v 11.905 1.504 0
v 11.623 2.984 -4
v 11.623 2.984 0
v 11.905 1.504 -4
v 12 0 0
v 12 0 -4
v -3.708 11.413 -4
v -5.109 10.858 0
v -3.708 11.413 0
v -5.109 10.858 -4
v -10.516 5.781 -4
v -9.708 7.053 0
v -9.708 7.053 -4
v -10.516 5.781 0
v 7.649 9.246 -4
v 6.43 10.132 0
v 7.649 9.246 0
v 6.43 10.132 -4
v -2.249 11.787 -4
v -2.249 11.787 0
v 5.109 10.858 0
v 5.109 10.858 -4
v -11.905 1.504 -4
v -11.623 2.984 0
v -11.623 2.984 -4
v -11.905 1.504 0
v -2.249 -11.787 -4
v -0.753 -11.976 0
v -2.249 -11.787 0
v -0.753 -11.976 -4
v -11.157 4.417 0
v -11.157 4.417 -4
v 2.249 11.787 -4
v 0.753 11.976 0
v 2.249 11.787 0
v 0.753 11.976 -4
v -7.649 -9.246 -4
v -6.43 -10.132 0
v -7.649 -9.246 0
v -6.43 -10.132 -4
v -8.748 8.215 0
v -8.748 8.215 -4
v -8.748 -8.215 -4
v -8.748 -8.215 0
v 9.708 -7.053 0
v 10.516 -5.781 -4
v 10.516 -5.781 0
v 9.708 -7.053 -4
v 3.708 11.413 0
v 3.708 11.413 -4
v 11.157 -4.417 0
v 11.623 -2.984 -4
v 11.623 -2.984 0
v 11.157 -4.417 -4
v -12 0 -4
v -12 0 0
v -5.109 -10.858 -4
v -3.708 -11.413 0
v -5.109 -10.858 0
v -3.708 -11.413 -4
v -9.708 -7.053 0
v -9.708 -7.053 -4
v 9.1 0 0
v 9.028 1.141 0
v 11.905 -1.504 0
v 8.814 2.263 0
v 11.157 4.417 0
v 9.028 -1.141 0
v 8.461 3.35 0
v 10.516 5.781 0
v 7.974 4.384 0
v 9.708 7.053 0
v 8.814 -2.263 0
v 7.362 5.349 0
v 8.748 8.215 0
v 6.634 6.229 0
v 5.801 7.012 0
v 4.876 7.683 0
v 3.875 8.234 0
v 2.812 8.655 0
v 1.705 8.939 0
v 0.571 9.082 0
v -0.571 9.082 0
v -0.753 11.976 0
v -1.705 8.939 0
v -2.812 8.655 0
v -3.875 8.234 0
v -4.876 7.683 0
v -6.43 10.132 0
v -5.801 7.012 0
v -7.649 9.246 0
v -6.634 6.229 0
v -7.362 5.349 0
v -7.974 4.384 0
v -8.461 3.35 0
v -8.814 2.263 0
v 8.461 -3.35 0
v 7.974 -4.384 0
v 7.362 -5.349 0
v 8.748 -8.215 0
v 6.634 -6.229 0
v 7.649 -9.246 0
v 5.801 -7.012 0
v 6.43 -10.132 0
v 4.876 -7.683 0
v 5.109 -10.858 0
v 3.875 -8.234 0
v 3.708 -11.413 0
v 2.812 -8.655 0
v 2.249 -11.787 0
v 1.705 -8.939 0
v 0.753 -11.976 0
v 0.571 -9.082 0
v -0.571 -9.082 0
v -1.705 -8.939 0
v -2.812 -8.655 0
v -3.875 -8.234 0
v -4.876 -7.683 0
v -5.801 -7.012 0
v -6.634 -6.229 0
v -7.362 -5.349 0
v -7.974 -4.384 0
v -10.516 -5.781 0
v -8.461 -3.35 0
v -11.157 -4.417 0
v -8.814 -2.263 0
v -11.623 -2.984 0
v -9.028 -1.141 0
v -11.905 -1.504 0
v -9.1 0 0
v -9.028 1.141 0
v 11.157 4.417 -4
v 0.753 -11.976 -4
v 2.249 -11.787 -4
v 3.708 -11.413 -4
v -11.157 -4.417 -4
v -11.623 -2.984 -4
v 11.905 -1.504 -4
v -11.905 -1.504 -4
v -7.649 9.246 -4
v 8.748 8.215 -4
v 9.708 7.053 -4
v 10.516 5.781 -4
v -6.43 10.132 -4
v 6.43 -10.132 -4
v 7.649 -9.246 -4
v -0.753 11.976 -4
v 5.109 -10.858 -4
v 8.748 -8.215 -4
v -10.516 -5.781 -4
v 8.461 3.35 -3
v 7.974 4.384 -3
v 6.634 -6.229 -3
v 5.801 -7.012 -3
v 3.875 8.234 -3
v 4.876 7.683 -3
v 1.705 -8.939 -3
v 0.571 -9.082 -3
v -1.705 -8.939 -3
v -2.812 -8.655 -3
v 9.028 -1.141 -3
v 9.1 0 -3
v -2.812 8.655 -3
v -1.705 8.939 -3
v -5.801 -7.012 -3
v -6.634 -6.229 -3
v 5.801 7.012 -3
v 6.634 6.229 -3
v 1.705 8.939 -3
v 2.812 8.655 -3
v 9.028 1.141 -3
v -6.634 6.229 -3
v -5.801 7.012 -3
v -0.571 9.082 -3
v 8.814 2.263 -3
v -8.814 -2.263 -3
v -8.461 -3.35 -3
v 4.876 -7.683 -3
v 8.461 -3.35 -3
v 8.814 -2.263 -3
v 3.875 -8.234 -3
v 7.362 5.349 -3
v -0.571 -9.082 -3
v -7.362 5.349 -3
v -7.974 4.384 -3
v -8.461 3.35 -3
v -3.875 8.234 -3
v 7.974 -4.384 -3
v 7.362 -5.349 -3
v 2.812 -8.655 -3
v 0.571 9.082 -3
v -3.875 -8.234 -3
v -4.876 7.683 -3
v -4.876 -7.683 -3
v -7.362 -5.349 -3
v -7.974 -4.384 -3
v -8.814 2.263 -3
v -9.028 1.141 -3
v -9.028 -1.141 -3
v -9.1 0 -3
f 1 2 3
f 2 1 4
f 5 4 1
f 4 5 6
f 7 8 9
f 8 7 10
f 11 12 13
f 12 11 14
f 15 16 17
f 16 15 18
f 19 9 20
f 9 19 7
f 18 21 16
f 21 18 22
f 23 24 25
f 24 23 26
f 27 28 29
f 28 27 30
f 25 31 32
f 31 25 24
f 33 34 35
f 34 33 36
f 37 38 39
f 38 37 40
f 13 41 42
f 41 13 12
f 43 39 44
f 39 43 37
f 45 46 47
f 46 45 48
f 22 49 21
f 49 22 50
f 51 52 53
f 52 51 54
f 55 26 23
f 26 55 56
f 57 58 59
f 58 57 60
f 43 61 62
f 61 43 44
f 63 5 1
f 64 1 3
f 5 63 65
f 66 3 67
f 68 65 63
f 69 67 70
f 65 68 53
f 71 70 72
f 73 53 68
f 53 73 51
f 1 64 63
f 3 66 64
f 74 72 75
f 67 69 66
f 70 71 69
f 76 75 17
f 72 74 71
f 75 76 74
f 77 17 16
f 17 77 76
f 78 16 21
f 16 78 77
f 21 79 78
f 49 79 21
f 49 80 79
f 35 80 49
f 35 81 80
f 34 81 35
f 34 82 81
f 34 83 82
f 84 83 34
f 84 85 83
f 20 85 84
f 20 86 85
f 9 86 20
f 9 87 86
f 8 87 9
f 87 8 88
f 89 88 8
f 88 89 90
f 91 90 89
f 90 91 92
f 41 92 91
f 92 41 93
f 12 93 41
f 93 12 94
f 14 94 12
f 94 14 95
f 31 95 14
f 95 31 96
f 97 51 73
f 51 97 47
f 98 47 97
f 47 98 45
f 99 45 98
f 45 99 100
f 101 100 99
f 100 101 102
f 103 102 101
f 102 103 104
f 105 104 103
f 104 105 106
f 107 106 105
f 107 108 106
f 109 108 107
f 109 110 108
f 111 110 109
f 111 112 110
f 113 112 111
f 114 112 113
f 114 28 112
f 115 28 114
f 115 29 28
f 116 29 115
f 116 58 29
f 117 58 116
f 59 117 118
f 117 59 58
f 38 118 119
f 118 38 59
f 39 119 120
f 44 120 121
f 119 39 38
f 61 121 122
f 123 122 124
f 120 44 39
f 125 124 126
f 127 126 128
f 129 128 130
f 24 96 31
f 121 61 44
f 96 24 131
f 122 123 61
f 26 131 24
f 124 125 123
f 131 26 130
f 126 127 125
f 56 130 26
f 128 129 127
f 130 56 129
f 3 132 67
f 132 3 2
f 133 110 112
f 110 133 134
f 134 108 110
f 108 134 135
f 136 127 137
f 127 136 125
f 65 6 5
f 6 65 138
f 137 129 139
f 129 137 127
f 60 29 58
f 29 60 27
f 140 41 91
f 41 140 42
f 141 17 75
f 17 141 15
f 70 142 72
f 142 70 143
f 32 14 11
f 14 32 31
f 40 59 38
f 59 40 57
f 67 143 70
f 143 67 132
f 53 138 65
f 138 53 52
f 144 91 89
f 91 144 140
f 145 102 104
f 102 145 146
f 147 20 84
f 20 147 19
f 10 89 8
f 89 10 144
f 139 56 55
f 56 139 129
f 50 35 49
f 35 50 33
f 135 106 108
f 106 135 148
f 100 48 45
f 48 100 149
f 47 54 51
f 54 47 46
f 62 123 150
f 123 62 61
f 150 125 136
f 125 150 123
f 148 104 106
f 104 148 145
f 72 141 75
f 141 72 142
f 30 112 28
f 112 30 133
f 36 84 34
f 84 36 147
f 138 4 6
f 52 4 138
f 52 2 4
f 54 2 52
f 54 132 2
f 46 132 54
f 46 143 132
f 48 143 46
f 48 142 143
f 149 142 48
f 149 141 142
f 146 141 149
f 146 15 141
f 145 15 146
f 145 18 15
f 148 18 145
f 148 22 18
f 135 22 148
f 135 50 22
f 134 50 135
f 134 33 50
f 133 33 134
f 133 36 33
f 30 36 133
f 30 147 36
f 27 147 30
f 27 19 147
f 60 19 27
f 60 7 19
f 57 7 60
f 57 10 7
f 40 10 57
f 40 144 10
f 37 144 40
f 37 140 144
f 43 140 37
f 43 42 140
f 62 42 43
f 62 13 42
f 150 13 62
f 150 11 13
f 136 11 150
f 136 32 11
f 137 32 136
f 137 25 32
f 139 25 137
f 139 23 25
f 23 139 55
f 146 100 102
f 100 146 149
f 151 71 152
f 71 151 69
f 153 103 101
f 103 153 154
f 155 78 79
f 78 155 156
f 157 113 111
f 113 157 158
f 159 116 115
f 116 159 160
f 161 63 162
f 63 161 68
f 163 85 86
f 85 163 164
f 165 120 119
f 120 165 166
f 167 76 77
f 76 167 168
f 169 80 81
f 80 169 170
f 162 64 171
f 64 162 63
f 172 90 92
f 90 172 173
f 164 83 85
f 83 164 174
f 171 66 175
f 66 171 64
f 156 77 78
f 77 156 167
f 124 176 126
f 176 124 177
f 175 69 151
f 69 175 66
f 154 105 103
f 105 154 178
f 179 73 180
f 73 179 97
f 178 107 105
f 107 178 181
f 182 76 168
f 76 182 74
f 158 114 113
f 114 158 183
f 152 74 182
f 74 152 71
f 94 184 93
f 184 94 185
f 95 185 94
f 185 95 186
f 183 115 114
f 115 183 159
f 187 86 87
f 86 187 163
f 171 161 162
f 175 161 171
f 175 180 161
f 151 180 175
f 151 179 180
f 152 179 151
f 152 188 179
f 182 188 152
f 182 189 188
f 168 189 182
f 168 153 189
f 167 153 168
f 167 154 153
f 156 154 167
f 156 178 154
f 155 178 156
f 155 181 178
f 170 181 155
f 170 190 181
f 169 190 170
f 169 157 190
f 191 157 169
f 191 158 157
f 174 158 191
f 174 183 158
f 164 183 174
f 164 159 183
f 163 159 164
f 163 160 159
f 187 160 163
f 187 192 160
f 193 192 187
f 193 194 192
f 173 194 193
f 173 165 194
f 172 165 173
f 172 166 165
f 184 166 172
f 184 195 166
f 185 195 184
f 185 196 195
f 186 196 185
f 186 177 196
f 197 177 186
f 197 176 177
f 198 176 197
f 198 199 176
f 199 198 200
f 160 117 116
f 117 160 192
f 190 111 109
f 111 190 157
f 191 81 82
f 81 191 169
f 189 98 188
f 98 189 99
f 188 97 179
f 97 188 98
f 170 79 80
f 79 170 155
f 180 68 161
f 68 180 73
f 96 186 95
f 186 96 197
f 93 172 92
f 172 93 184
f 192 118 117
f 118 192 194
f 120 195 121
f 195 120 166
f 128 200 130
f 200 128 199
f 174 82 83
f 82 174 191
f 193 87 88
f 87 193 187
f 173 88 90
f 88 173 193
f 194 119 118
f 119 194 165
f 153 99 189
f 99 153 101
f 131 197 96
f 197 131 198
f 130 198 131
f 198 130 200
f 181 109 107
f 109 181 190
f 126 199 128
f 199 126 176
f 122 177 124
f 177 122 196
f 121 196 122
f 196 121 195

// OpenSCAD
$fn = 50;


difference() {
	union() {
		translate(v = [0, 0, -4.0000000000]) {
			cylinder(h = 4, r = 12.0000000000);
		}
	}
	union() {
		#translate(v = [0, 0, -3.0000000000]) {
			cylinder(h = 3, r = 9.1000000000);
		}
	}
}
